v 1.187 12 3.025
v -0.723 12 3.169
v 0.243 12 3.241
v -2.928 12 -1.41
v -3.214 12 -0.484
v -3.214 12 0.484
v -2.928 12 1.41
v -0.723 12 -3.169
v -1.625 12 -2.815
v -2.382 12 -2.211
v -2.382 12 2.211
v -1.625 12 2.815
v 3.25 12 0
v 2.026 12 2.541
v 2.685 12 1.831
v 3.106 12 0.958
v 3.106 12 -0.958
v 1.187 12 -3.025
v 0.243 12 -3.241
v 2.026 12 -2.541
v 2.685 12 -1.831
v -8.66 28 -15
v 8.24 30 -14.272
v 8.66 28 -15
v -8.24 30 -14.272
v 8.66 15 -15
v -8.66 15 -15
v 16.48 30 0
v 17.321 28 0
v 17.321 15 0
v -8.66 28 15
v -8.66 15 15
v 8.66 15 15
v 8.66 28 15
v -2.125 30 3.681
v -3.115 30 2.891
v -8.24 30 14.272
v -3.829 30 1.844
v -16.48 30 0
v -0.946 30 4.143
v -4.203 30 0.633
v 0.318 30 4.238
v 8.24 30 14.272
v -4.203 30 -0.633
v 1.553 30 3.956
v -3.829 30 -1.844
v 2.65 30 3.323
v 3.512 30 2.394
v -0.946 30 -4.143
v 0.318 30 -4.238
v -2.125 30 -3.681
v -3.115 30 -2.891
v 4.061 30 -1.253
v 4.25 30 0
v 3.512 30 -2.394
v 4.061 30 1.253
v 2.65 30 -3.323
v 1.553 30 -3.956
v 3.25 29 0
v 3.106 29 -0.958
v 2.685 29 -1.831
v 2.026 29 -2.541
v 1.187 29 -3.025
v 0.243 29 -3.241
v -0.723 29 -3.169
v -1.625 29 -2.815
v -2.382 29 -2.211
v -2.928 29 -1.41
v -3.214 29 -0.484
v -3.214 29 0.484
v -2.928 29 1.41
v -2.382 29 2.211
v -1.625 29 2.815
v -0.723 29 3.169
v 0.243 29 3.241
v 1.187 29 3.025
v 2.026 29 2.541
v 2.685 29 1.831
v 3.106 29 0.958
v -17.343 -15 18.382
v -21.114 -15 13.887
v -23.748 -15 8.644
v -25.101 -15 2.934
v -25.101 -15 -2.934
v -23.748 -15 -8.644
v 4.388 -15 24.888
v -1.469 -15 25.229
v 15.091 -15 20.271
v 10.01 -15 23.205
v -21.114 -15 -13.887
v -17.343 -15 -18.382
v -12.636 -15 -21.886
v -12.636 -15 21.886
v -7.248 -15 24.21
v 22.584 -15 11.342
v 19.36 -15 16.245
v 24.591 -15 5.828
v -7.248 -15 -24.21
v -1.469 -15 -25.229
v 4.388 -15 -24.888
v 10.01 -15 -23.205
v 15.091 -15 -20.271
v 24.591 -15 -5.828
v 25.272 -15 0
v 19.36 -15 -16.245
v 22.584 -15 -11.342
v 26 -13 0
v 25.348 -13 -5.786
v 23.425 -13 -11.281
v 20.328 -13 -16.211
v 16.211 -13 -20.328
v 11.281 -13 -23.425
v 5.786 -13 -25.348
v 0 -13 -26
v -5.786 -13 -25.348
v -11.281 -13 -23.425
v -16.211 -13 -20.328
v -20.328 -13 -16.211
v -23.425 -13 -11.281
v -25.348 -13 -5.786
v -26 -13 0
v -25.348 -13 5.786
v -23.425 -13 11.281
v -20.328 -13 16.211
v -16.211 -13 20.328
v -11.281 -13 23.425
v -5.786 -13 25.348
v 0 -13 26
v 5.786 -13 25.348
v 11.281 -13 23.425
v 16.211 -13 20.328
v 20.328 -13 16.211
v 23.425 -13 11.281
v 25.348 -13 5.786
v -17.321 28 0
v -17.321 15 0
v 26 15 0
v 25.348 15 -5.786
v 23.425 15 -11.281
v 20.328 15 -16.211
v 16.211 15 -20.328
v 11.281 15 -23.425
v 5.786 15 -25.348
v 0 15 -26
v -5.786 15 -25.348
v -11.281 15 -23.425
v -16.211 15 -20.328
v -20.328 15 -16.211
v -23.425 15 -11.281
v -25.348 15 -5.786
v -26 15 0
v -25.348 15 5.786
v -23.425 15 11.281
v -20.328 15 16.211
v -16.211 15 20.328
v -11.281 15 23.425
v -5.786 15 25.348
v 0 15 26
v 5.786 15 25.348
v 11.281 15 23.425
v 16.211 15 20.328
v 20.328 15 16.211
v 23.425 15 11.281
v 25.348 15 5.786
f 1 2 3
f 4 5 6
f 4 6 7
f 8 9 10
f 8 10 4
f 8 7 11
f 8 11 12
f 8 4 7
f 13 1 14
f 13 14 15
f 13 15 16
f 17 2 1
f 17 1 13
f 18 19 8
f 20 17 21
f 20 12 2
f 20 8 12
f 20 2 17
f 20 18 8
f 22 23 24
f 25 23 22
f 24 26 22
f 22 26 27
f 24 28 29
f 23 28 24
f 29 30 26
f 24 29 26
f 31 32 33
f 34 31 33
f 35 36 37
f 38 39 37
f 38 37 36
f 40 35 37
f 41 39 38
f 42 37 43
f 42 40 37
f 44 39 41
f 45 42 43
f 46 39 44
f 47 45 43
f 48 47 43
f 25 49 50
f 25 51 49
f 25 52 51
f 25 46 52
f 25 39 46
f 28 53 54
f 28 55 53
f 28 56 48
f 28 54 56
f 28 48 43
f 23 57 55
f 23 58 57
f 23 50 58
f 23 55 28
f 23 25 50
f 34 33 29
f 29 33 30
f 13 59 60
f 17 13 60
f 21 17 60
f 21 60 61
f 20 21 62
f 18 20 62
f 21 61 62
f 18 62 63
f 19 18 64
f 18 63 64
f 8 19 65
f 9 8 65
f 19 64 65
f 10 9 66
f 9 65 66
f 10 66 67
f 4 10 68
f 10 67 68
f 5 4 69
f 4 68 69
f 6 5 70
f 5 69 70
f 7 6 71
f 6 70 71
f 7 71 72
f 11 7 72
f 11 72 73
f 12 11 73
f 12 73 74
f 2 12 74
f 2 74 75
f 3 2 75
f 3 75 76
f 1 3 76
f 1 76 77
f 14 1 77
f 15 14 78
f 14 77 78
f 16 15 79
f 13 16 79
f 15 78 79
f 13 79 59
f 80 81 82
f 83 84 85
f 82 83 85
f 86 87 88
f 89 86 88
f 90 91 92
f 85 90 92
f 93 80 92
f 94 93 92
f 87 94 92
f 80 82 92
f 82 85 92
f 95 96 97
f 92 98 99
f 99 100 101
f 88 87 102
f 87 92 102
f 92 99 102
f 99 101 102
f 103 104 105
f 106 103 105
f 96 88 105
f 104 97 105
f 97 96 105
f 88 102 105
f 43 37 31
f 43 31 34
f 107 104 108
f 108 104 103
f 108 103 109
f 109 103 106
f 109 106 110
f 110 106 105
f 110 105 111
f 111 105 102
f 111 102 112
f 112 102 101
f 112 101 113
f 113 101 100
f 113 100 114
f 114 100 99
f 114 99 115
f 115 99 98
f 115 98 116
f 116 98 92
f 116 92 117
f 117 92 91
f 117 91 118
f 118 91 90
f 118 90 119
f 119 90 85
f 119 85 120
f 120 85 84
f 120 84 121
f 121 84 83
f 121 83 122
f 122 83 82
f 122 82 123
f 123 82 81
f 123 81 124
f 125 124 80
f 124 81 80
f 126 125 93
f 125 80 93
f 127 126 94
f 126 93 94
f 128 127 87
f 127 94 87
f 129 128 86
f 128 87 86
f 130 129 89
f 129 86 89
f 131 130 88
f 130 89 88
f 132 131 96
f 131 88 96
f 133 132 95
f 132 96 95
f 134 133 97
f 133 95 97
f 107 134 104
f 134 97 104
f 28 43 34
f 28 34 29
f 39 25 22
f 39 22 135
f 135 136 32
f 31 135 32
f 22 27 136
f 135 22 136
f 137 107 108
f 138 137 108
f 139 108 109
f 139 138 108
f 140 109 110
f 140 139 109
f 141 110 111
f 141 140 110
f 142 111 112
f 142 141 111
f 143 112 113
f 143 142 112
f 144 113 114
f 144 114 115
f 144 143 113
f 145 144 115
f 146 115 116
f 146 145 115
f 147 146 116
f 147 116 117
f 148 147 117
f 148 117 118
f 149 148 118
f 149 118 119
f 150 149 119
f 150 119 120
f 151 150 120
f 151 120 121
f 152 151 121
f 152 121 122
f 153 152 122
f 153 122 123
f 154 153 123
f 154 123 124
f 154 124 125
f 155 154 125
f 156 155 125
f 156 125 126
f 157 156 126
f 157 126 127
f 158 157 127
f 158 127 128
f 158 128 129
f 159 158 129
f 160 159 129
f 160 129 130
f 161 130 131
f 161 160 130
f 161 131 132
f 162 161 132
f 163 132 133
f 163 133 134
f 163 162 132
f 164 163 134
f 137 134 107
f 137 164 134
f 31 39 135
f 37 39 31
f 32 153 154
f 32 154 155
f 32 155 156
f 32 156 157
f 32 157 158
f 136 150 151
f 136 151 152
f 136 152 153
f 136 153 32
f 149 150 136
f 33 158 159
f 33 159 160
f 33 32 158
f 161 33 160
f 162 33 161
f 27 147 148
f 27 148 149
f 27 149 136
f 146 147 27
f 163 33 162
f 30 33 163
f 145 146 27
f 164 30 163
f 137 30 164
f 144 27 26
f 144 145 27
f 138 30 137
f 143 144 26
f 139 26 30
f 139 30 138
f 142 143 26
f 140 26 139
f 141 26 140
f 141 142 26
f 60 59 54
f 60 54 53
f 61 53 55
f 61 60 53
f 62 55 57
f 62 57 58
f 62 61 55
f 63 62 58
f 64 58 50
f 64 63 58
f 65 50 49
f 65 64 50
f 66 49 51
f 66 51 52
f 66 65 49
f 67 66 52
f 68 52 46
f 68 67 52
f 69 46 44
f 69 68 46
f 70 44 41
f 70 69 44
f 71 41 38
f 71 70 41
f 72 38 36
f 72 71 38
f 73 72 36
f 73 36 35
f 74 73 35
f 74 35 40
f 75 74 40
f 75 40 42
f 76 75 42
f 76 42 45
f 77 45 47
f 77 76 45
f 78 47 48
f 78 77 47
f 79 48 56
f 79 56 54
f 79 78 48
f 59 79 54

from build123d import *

# Parameters (mm, degrees)
SKETCH1_R             = 26
BOSS_EXTRUDE1_DEPTH   = 15
BOSS_EXTRUDE2_DEPTH   = 15
CHAMFER1_SIZE         = 2
CHAMFER1_SIZE2        = 0.727940469
CHAMFER1_PART_2_SIZE  = 2
CHAMFER1_PART_2_SIZE2 = 0.727940469
CHAMFER1_PART_3_SIZE  = 2
CHAMFER1_PART_3_SIZE2 = 0.727940469
CHAMFER1_PART_4_SIZE  = 2
CHAMFER1_PART_4_SIZE2 = 0.727940469
CHAMFER1_PART_5_SIZE  = 2
CHAMFER1_PART_5_SIZE2 = 0.727940469
CHAMFER1_PART_6_SIZE  = 2
CHAMFER1_PART_6_SIZE2 = 0.727940469
CHAMFER2_SIZE         = 2
CHAMFER2_SIZE2        = 0.727940469
SKETCH3_R             = 3.25
CUT_EXTRUDE1_DEPTH    = 18
CHAMFER3_SIZE         = 1


with BuildPart() as part:
    # Sketch1 → Boss-Extrude1 (new body, symmetric)
    with BuildSketch(Plane(origin=(0, 0, 0), x_dir=(1, 0, 0), z_dir=(0, 1, 0))):
        Circle(SKETCH1_R)
    extrude(amount=BOSS_EXTRUDE1_DEPTH, both=True)

    # Sketch2 → Boss-Extrude2 (add)
    with BuildSketch(Plane(origin=(0, 15, 0), x_dir=(1, 0, 0), z_dir=(0, 1, 0))):
        Polygon((-17.320508076, 0), (-8.660254038, -15), (8.660254038, -15), (17.320508076, 0), (8.660254038, 15), (-8.660254038, 15), align=None)
    extrude(amount=BOSS_EXTRUDE2_DEPTH)

    # Chamfer1
    chamfer1_edges = [part.edges().sort_by_distance(p)[0] for p in [
        (-12.990381057, 30, -7.5),
    ]]
    chamfer1_side = [part.faces().sort_by_distance(p)[0] for p in [
        (-12.990381057, 22.5, -7.5),
    ]]
    chamfer(chamfer1_edges, length=CHAMFER1_SIZE, length2=CHAMFER1_SIZE2, reference=chamfer1_side[0])

    # Chamfer1 part 2
    chamfer1_part_2_edges = [part.edges().sort_by_distance(p)[0] for p in [
        (-12.990381057, 30, 7.5),
    ]]
    chamfer1_part_2_side = [part.faces().sort_by_distance(p)[0] for p in [
        (-12.990381057, 22.5, 7.5),
    ]]
    chamfer(chamfer1_part_2_edges, length=CHAMFER1_PART_2_SIZE, length2=CHAMFER1_PART_2_SIZE2, reference=chamfer1_part_2_side[0])

    # Chamfer1 part 3
    chamfer1_part_3_edges = [part.edges().sort_by_distance(p)[0] for p in [
        (0, 30, 15),
    ]]
    chamfer1_part_3_side = [part.faces().sort_by_distance(p)[0] for p in [
        (0, 22.5, 15),
    ]]
    chamfer(chamfer1_part_3_edges, length=CHAMFER1_PART_3_SIZE, length2=CHAMFER1_PART_3_SIZE2, reference=chamfer1_part_3_side[0])

    # Chamfer1 part 4
    chamfer1_part_4_edges = [part.edges().sort_by_distance(p)[0] for p in [
        (12.990381057, 30, 7.5),
    ]]
    chamfer1_part_4_side = [part.faces().sort_by_distance(p)[0] for p in [
        (12.990381057, 22.5, 7.5),
    ]]
    chamfer(chamfer1_part_4_edges, length=CHAMFER1_PART_4_SIZE, length2=CHAMFER1_PART_4_SIZE2, reference=chamfer1_part_4_side[0])

    # Chamfer1 part 5
    chamfer1_part_5_edges = [part.edges().sort_by_distance(p)[0] for p in [
        (12.990381057, 30, -7.5),
    ]]
    chamfer1_part_5_side = [part.faces().sort_by_distance(p)[0] for p in [
        (12.990381057, 22.5, -7.5),
    ]]
    chamfer(chamfer1_part_5_edges, length=CHAMFER1_PART_5_SIZE, length2=CHAMFER1_PART_5_SIZE2, reference=chamfer1_part_5_side[0])

    # Chamfer1 part 6
    chamfer1_part_6_edges = [part.edges().sort_by_distance(p)[0] for p in [
        (0, 30, -15),
    ]]
    chamfer1_part_6_side = [part.faces().sort_by_distance(p)[0] for p in [
        (0, 22.5, -15),
    ]]
    chamfer(chamfer1_part_6_edges, length=CHAMFER1_PART_6_SIZE, length2=CHAMFER1_PART_6_SIZE2, reference=chamfer1_part_6_side[0])

    # Chamfer2
    chamfer2_edges = [part.edges().sort_by_distance(p)[0] for p in [
        (-26, -15, 0),
    ]]
    chamfer2_side = [part.faces().sort_by_distance(p)[0] for p in [
        (-26, 0, 0),
    ]]
    chamfer(chamfer2_edges, length=CHAMFER2_SIZE, length2=CHAMFER2_SIZE2, reference=chamfer2_side[0])

    # Sketch3 → Cut-Extrude1 (cut)
    with BuildSketch(Plane(origin=(0, 30, 0), x_dir=(1, 0, 0), z_dir=(0, 1, 0))):
        Circle(SKETCH3_R)
    extrude(amount=-CUT_EXTRUDE1_DEPTH, mode=Mode.SUBTRACT)

    # Chamfer3
    chamfer3_edges = [part.edges().sort_by_distance(p)[0] for p in [
        (-3.25, 30, 0),
    ]]
    chamfer(chamfer3_edges, length=CHAMFER3_SIZE)


solid = part.part
